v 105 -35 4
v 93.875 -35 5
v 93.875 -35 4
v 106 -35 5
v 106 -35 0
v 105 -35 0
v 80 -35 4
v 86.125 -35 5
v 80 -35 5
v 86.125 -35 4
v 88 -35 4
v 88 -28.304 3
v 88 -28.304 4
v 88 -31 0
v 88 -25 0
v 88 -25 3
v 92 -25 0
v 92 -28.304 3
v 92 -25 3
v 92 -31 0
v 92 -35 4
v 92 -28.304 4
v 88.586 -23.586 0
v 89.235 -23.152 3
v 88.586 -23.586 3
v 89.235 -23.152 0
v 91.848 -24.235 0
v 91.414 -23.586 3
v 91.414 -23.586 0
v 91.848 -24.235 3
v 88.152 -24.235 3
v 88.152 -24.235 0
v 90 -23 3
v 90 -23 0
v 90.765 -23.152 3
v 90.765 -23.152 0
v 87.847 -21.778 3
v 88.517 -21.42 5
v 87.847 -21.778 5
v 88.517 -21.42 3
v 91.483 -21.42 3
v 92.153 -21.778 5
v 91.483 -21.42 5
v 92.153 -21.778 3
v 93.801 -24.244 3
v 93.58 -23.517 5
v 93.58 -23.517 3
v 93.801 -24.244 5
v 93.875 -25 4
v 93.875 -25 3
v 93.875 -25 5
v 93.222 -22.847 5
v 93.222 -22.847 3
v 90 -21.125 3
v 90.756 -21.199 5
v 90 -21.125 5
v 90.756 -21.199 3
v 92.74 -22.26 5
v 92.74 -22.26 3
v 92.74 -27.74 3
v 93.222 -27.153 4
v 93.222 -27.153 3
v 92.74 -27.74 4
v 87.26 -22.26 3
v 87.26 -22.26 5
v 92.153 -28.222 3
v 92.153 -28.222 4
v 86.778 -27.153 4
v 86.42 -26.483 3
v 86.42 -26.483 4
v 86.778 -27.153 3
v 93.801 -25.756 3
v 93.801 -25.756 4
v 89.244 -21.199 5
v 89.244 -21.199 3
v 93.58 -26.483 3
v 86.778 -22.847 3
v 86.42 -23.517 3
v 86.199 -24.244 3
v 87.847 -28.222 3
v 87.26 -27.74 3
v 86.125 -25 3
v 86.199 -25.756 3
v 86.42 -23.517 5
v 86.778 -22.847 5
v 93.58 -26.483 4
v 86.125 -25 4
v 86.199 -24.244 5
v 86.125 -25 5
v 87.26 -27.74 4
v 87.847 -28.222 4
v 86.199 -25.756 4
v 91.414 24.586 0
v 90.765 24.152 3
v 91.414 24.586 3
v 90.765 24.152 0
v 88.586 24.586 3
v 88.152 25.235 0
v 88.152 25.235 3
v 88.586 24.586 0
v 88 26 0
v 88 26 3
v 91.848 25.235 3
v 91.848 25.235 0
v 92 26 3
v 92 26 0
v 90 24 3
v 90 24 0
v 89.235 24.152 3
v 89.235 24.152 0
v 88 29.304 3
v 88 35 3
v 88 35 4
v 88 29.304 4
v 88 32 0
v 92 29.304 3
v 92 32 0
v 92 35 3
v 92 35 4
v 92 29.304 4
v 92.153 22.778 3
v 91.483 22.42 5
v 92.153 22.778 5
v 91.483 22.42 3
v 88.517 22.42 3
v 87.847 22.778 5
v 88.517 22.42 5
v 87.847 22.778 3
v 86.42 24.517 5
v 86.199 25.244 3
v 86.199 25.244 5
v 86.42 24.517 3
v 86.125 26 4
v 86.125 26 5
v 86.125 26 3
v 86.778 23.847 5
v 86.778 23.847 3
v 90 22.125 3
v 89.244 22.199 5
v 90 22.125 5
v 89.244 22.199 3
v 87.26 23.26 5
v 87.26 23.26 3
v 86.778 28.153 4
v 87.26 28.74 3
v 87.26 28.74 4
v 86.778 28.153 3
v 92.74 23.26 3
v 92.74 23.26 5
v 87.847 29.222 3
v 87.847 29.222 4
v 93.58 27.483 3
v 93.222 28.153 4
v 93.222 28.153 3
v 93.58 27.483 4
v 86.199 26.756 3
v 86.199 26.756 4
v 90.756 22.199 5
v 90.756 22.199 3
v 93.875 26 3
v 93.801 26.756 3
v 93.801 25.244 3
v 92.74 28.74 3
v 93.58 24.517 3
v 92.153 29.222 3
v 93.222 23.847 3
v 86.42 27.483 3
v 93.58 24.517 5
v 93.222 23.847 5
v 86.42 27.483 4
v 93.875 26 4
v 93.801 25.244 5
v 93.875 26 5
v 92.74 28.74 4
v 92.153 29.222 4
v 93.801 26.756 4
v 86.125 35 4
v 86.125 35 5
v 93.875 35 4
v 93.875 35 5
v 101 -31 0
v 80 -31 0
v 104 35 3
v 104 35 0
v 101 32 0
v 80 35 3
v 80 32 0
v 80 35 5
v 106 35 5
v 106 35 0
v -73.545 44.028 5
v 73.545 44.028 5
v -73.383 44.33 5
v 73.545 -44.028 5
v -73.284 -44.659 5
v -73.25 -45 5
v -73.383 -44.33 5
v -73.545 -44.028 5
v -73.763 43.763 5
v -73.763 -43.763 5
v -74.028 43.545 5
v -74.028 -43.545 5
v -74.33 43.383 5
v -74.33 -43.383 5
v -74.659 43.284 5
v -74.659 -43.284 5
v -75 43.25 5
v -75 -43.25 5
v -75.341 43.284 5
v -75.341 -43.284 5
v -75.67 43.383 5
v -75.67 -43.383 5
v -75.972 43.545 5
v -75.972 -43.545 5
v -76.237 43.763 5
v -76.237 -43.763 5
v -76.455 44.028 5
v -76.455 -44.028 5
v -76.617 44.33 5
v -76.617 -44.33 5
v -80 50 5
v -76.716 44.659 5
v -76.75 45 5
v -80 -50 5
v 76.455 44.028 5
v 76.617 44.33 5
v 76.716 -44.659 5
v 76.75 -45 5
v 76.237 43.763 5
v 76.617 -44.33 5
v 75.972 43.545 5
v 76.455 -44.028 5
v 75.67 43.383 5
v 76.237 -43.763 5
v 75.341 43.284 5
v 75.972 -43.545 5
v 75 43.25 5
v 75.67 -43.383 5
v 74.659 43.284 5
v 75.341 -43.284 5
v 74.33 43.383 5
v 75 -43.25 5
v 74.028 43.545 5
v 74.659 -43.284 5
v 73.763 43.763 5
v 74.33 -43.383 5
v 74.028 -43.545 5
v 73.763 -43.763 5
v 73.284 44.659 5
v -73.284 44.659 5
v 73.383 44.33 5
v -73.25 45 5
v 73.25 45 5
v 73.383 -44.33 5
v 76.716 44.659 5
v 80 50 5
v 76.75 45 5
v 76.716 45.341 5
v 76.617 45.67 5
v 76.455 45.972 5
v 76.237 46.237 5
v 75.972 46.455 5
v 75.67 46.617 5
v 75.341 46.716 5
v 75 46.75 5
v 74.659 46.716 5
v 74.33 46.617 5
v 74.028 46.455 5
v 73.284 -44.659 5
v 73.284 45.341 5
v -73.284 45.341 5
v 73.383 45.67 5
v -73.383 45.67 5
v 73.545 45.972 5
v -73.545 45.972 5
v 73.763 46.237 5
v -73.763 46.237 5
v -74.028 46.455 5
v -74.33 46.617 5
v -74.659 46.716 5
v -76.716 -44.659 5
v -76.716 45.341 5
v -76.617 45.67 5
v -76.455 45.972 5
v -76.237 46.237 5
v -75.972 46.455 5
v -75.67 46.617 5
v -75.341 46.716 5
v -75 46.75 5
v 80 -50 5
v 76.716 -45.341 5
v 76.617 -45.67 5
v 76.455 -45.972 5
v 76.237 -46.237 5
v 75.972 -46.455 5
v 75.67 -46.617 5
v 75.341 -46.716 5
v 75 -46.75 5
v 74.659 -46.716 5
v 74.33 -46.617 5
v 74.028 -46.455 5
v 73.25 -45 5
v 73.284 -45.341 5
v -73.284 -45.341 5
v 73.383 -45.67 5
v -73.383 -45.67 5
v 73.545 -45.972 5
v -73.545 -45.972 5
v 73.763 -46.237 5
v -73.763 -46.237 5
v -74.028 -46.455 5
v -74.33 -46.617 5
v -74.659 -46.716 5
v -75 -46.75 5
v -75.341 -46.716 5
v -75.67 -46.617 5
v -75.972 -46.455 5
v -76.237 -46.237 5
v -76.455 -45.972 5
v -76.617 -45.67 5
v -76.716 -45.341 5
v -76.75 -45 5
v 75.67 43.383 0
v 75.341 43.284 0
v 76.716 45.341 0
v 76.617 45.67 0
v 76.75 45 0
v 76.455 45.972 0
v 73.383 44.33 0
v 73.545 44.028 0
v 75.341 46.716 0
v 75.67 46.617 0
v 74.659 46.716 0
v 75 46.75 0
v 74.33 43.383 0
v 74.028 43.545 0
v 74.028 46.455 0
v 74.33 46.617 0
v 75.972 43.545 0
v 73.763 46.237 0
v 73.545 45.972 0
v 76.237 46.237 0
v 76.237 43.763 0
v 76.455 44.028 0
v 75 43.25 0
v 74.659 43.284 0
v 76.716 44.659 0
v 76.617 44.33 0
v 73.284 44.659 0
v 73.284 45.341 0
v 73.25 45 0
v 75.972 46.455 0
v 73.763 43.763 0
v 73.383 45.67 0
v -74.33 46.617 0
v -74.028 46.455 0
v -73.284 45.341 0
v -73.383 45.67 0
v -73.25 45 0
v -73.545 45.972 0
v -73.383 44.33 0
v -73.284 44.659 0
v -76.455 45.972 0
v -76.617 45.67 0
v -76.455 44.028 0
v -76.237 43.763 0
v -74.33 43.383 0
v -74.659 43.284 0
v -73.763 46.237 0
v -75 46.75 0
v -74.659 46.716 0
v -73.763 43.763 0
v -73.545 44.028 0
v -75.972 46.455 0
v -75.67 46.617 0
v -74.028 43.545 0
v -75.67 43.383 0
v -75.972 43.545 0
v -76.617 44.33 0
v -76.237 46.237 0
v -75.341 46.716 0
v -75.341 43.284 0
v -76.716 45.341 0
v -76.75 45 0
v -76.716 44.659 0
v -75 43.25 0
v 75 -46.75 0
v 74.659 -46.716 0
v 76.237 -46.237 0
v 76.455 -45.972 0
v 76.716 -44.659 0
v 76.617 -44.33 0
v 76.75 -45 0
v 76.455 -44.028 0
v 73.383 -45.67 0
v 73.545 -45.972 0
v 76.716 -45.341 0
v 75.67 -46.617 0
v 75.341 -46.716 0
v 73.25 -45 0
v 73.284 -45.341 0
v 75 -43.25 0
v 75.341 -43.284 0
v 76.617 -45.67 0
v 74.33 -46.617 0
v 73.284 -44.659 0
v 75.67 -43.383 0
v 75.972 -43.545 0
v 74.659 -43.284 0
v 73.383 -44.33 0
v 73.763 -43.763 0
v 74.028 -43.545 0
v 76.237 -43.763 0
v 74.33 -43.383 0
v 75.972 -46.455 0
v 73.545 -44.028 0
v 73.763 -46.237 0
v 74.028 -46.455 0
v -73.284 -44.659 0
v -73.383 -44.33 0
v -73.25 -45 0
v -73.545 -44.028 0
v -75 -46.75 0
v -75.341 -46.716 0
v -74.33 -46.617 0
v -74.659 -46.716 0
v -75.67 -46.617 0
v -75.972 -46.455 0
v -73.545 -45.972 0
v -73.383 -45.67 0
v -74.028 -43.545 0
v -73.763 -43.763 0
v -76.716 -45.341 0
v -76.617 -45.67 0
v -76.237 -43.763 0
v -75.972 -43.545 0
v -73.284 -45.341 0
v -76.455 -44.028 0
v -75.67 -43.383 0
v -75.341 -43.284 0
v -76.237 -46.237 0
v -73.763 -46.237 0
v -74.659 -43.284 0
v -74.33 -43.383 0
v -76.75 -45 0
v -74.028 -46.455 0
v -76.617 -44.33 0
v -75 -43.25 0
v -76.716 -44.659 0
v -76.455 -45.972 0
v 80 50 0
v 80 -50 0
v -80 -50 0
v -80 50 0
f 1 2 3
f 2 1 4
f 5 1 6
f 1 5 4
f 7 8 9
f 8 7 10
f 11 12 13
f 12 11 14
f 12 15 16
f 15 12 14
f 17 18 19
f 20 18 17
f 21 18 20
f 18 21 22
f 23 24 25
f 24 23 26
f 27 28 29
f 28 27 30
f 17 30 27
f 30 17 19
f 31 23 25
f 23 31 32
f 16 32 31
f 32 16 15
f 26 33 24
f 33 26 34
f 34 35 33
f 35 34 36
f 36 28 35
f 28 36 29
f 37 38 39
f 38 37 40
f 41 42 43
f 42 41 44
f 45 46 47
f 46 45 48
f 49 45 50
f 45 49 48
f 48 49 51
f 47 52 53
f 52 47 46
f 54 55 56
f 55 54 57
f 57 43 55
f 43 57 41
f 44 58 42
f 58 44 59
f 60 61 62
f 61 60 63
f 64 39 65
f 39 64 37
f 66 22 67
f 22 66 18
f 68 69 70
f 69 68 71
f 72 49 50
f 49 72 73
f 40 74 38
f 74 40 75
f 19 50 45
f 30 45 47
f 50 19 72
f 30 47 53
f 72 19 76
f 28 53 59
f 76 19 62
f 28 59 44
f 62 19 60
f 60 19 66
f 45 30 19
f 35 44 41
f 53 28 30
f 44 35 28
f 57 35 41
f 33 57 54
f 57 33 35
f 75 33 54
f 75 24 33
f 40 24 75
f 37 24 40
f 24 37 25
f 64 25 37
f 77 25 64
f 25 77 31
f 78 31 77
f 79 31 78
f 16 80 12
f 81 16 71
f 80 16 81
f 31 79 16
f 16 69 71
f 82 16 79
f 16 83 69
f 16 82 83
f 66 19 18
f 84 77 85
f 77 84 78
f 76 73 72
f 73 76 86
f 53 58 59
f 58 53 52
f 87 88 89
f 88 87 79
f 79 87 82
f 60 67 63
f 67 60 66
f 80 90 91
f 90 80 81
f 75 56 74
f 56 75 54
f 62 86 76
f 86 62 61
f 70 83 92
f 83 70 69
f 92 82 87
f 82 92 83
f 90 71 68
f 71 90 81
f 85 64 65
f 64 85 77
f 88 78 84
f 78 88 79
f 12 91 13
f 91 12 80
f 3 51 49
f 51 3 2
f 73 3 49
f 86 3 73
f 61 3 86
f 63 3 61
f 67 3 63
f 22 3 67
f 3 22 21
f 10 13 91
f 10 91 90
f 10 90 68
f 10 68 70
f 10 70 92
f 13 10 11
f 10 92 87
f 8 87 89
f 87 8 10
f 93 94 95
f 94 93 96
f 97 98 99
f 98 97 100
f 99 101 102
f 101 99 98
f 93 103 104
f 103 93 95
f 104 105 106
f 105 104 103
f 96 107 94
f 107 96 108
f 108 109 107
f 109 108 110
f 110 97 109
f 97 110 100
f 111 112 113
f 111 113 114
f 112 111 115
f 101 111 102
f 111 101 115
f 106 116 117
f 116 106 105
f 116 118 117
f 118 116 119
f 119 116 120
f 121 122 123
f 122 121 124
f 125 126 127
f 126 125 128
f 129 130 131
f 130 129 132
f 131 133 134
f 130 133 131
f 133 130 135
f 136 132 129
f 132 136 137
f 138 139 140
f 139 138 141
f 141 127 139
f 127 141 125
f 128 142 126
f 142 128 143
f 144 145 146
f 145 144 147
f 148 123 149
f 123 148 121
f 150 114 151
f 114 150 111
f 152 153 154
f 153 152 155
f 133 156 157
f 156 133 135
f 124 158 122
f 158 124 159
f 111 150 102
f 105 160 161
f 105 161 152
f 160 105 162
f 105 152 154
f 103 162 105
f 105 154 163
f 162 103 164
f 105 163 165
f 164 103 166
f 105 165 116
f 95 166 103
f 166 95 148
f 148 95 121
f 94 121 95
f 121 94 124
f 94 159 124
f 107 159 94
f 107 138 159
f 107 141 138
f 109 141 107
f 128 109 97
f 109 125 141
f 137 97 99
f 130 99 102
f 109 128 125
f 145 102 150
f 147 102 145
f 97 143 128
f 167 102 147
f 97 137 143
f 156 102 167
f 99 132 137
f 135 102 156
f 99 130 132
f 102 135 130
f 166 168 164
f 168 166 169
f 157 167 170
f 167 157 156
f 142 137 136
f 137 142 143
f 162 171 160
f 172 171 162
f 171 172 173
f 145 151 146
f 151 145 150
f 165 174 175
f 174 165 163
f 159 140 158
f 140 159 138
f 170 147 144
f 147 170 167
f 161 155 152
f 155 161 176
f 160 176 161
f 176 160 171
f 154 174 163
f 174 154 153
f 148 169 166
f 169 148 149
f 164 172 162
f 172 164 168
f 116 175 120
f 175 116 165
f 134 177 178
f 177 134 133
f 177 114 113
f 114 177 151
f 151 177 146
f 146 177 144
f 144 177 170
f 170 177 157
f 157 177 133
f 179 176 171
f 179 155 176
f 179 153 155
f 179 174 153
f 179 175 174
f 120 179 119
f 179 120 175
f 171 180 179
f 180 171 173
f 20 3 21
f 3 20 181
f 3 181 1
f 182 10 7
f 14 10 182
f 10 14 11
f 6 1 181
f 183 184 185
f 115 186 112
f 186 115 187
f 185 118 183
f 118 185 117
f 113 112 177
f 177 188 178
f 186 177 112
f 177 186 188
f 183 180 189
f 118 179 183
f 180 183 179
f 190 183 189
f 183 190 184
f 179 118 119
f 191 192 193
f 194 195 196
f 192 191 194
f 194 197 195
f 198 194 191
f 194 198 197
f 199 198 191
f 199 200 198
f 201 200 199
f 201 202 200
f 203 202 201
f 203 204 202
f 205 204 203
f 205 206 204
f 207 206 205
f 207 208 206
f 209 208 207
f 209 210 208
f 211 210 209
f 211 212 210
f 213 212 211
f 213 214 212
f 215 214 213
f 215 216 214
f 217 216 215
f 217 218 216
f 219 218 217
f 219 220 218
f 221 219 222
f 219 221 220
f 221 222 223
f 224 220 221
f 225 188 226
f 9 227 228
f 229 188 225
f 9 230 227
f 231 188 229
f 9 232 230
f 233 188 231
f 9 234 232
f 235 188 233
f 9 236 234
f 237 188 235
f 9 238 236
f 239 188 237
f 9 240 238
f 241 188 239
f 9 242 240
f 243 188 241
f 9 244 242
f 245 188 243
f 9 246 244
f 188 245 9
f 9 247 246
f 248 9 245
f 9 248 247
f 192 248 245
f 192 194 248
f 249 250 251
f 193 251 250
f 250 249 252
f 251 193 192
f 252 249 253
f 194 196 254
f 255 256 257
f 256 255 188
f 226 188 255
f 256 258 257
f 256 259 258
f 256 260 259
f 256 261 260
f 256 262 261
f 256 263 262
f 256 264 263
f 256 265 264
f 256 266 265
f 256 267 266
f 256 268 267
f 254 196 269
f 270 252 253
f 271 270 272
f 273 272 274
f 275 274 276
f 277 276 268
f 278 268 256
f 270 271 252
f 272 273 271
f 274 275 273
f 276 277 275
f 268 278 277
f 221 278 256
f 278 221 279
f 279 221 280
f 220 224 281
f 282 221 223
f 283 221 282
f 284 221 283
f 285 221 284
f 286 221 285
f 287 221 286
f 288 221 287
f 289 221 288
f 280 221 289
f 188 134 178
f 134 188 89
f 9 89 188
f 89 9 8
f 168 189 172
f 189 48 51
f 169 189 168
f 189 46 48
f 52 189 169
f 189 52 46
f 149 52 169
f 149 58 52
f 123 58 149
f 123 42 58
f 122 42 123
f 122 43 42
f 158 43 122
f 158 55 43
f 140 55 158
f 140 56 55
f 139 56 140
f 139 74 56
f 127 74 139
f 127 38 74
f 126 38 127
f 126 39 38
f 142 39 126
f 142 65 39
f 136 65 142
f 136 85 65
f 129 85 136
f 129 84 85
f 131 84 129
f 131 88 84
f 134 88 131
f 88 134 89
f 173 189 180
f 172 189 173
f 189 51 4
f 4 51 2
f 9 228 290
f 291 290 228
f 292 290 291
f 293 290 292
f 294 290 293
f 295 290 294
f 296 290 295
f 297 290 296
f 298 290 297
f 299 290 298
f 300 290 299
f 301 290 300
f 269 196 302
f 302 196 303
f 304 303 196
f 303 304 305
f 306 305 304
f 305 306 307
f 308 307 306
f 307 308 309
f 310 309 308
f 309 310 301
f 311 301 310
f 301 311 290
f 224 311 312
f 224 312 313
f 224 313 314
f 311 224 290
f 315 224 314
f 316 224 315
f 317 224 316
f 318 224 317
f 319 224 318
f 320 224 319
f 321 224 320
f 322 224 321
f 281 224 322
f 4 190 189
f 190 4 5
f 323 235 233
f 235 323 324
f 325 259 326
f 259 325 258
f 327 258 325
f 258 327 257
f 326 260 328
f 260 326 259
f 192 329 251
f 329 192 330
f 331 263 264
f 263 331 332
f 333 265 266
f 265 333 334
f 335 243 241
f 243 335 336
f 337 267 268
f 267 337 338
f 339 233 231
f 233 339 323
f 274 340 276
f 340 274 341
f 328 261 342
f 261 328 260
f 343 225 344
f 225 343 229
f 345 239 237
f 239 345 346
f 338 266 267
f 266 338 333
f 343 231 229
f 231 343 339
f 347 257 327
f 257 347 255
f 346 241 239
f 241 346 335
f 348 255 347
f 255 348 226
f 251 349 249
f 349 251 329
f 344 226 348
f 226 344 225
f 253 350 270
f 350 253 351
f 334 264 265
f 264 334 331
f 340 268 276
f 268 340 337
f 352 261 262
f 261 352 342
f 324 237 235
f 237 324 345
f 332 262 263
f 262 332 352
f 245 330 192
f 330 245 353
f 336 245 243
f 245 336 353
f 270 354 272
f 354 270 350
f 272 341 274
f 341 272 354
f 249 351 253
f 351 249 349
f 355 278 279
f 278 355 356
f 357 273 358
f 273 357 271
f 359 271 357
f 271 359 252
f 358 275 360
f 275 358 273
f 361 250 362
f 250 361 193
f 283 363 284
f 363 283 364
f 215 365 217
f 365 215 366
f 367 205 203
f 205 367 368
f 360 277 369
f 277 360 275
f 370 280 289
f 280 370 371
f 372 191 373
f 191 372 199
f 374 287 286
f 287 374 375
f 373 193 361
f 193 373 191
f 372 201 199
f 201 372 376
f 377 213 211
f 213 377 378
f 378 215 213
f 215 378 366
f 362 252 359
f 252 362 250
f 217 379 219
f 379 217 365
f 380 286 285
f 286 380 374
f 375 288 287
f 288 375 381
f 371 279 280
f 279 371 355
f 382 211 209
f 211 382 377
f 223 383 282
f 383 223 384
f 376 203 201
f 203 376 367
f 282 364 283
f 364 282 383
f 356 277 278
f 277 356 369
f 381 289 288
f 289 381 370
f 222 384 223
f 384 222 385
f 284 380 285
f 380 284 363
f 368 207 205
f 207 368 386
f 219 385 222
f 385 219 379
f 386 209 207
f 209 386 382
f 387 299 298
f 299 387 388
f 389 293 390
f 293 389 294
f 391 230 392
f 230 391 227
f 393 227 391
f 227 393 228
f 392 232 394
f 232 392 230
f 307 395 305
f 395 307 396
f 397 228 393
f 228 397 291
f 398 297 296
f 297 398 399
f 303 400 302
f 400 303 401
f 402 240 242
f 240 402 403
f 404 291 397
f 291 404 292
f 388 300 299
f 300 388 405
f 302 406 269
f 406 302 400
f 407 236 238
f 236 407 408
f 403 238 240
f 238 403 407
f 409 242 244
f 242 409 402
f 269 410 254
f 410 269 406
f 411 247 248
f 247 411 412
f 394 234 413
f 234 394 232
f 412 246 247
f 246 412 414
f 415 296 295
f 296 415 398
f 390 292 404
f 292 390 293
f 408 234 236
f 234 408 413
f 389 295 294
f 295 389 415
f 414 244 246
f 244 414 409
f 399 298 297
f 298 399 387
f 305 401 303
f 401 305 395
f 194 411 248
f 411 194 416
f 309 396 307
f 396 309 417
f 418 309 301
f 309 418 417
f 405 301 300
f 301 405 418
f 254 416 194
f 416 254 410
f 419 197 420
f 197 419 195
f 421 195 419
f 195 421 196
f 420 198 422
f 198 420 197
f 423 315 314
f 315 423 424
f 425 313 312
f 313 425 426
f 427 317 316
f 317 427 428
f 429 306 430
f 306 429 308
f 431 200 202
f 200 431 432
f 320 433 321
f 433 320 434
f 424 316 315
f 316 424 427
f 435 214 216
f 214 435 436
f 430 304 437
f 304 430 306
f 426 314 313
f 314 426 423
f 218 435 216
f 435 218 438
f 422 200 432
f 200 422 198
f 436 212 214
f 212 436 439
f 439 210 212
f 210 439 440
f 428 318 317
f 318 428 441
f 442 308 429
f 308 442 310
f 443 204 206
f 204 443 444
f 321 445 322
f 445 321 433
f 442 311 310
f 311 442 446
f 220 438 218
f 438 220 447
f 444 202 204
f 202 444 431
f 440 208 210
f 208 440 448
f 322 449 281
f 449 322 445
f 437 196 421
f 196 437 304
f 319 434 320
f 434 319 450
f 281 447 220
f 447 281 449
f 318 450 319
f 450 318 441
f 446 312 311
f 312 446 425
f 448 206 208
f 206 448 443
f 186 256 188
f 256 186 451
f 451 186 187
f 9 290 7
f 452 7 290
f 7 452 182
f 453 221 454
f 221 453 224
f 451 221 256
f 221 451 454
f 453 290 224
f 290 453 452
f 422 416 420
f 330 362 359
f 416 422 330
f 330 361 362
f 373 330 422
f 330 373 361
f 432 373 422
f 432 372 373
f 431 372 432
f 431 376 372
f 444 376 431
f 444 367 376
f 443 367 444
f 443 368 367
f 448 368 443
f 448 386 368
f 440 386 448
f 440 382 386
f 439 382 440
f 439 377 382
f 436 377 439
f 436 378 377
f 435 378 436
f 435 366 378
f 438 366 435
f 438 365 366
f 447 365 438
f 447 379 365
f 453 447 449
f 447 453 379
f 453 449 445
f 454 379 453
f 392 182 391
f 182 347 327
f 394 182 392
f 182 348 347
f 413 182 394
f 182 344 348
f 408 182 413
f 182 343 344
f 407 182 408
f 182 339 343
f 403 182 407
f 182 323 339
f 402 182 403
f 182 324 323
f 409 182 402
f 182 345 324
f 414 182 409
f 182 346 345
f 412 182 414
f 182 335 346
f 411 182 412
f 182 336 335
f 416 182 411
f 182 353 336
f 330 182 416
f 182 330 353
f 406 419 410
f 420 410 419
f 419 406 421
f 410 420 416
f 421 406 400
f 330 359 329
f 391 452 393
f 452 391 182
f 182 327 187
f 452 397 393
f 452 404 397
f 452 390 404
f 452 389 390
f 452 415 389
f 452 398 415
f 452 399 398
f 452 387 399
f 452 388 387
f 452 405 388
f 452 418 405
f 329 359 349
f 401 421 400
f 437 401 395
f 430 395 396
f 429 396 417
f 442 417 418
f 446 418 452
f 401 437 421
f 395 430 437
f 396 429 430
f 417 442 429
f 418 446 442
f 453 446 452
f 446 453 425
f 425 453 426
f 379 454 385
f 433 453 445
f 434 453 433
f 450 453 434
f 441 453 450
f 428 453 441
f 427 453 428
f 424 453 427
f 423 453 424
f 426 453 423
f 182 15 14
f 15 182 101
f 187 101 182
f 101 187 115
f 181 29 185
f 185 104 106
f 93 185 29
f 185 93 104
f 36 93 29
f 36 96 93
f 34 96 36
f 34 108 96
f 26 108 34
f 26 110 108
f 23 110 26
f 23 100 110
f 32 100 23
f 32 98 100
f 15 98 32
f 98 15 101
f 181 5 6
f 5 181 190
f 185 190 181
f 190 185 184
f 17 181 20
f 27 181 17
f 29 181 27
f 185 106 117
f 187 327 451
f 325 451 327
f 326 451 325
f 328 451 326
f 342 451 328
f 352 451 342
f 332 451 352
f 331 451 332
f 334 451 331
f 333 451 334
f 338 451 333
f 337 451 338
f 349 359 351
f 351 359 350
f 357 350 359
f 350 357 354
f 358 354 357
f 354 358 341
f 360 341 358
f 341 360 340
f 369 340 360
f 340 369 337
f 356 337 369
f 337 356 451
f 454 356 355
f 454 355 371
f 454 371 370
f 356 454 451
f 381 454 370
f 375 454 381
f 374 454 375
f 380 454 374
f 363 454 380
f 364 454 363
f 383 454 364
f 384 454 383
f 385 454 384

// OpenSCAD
// Generated by SolidPython 1.1.3 on 2024-01-12 12:28:14


difference() {
	union() {
		translate(v = [90, 0, -11]) {
			rotate(a = 90, v = [0, 0, 1]) {
				difference() {
					union() {
						union();
						translate(v = [-35, 0, 0]) {
							rotate(a = [0, 90.0, 0.0]) {
								translate(v = [0, 0, 35.0]) {
									cube(center = true, size = [32.0000000000, 32.0000000000, 70.0]);
								}
							}
						}
						union();
					}
					union() {
						union();
						translate(v = [-35, 0, 0]) {
							rotate(a = [0, 90.0, 0.0]) {
								translate(v = [0, 0, 10]) {
									rotate(a = -90, v = [0, -1, 0]) {
										rotate(a = 90, v = [0, 0, 1]) {
											union() {
												union();
												translate(v = [0, -10, 0]) {
													rotate(a = -90, v = [1, 0, 0]) {
														polyhedron(convexity = 10, faces = [[0, 1, 4], [1, 5, 4], [1, 2, 5], [2, 6, 5], [2, 3, 6], [3, 7, 6], [3, 0, 7], [0, 4, 7], [3, 2, 1, 0], [4, 5, 6, 7]], points = [[-15.0000000000, 15.0000000000, 0.0000000000], [15.0000000000, 15.0000000000, 0.0000000000], [15.0000000000, -15.0000000000, 0.0000000000], [-15.0000000000, -15.0000000000, 0.0000000000], [0.0000000000, 0.0000000000, 15.0000000000], [0.0000000000, 0.0000000000, 15.0000000000], [0.0000000000, 0.0000000000, 15.0000000000], [0.0000000000, 0.0000000000, 15.0000000000]]);
													}
												}
												translate(v = [0, 51.0, 0]) {
													rotate(a = 180, v = [1, 0, 0]) {
														translate(v = [0, -10, 0]) {
															rotate(a = -90, v = [1, 0, 0]) {
																polyhedron(convexity = 10, faces = [[0, 1, 4], [1, 5, 4], [1, 2, 5], [2, 6, 5], [2, 3, 6], [3, 7, 6], [3, 0, 7], [0, 4, 7], [3, 2, 1, 0], [4, 5, 6, 7]], points = [[-15.0000000000, 15.0000000000, 0.0000000000], [15.0000000000, 15.0000000000, 0.0000000000], [15.0000000000, -15.0000000000, 0.0000000000], [-15.0000000000, -15.0000000000, 0.0000000000], [0.0000000000, 0.0000000000, 15.0000000000], [0.0000000000, 0.0000000000, 15.0000000000], [0.0000000000, 0.0000000000, 15.0000000000], [0.0000000000, 0.0000000000, 15.0000000000]]);
															}
														}
													}
												}
												translate(v = [0, -10, 0]) {
													rotate(a = -90, v = [1, 0, 0]) {
														union() {
															polyhedron(convexity = 10, faces = [[0, 1, 5], [1, 6, 5], [1, 2, 6], [2, 7, 6], [2, 3, 7], [3, 8, 7], [3, 4, 8], [4, 9, 8], [4, 0, 9], [0, 5, 9], [4, 3, 2, 1, 0], [5, 6, 7, 8, 9]], points = [[-10.2, 10.2, 0.0], [-10.2, 2.8, 0.0], [-4.3999999999999995, 2.8, 0.0], [-4.3999999999999995, 0.0, 0.0], [0.0, 0.0, 0.0], [-10.2, 10.2, 70.0], [-10.2, 2.8, 70.0], [-4.3999999999999995, 2.8, 70.0], [-4.3999999999999995, 0.0, 70.0], [0.0, 0.0, 70.0]]);
															mirror(v = [0, 1]) {
																polyhedron(convexity = 10, faces = [[0, 1, 5], [1, 6, 5], [1, 2, 6], [2, 7, 6], [2, 3, 7], [3, 8, 7], [3, 4, 8], [4, 9, 8], [4, 0, 9], [0, 5, 9], [4, 3, 2, 1, 0], [5, 6, 7, 8, 9]], points = [[-10.2, 10.2, 0.0], [-10.2, 2.8, 0.0], [-4.3999999999999995, 2.8, 0.0], [-4.3999999999999995, 0.0, 0.0], [0.0, 0.0, 0.0], [-10.2, 10.2, 70.0], [-10.2, 2.8, 70.0], [-4.3999999999999995, 2.8, 70.0], [-4.3999999999999995, 0.0, 70.0], [0.0, 0.0, 70.0]]);
															}
															mirror(v = [1, 1]) {
																union() {
																	polyhedron(convexity = 10, faces = [[0, 1, 5], [1, 6, 5], [1, 2, 6], [2, 7, 6], [2, 3, 7], [3, 8, 7], [3, 4, 8], [4, 9, 8], [4, 0, 9], [0, 5, 9], [4, 3, 2, 1, 0], [5, 6, 7, 8, 9]], points = [[-10.2, 10.2, 0.0], [-10.2, 2.8, 0.0], [-4.3999999999999995, 2.8, 0.0], [-4.3999999999999995, 0.0, 0.0], [0.0, 0.0, 0.0], [-10.2, 10.2, 70.0], [-10.2, 2.8, 70.0], [-4.3999999999999995, 2.8, 70.0], [-4.3999999999999995, 0.0, 70.0], [0.0, 0.0, 70.0]]);
																	mirror(v = [0, 1]) {
																		polyhedron(convexity = 10, faces = [[0, 1, 5], [1, 6, 5], [1, 2, 6], [2, 7, 6], [2, 3, 7], [3, 8, 7], [3, 4, 8], [4, 9, 8], [4, 0, 9], [0, 5, 9], [4, 3, 2, 1, 0], [5, 6, 7, 8, 9]], points = [[-10.2, 10.2, 0.0], [-10.2, 2.8, 0.0], [-4.3999999999999995, 2.8, 0.0], [-4.3999999999999995, 0.0, 0.0], [0.0, 0.0, 0.0], [-10.2, 10.2, 70.0], [-10.2, 2.8, 70.0], [-4.3999999999999995, 2.8, 70.0], [-4.3999999999999995, 0.0, 70.0], [0.0, 0.0, 70.0]]);
																	}
																}
															}
															mirror(v = [1, -1]) {
																union() {
																	polyhedron(convexity = 10, faces = [[0, 1, 5], [1, 6, 5], [1, 2, 6], [2, 7, 6], [2, 3, 7], [3, 8, 7], [3, 4, 8], [4, 9, 8], [4, 0, 9], [0, 5, 9], [4, 3, 2, 1, 0], [5, 6, 7, 8, 9]], points = [[-10.2, 10.2, 0.0], [-10.2, 2.8, 0.0], [-4.3999999999999995, 2.8, 0.0], [-4.3999999999999995, 0.0, 0.0], [0.0, 0.0, 0.0], [-10.2, 10.2, 70.0], [-10.2, 2.8, 70.0], [-4.3999999999999995, 2.8, 70.0], [-4.3999999999999995, 0.0, 70.0], [0.0, 0.0, 70.0]]);
																	mirror(v = [0, 1]) {
																		polyhedron(convexity = 10, faces = [[0, 1, 5], [1, 6, 5], [1, 2, 6], [2, 7, 6], [2, 3, 7], [3, 8, 7], [3, 4, 8], [4, 9, 8], [4, 0, 9], [0, 5, 9], [4, 3, 2, 1, 0], [5, 6, 7, 8, 9]], points = [[-10.2, 10.2, 0.0], [-10.2, 2.8, 0.0], [-4.3999999999999995, 2.8, 0.0], [-4.3999999999999995, 0.0, 0.0], [0.0, 0.0, 0.0], [-10.2, 10.2, 70.0], [-10.2, 2.8, 70.0], [-4.3999999999999995, 2.8, 70.0], [-4.3999999999999995, 0.0, 70.0], [0.0, 0.0, 70.0]]);
																	}
																	mirror(v = [1, 1]) {
																		union() {
																			polyhedron(convexity = 10, faces = [[0, 1, 5], [1, 6, 5], [1, 2, 6], [2, 7, 6], [2, 3, 7], [3, 8, 7], [3, 4, 8], [4, 9, 8], [4, 0, 9], [0, 5, 9], [4, 3, 2, 1, 0], [5, 6, 7, 8, 9]], points = [[-10.2, 10.2, 0.0], [-10.2, 2.8, 0.0], [-4.3999999999999995, 2.8, 0.0], [-4.3999999999999995, 0.0, 0.0], [0.0, 0.0, 0.0], [-10.2, 10.2, 70.0], [-10.2, 2.8, 70.0], [-4.3999999999999995, 2.8, 70.0], [-4.3999999999999995, 0.0, 70.0], [0.0, 0.0, 70.0]]);
																			mirror(v = [0, 1]) {
																				polyhedron(convexity = 10, faces = [[0, 1, 5], [1, 6, 5], [1, 2, 6], [2, 7, 6], [2, 3, 7], [3, 8, 7], [3, 4, 8], [4, 9, 8], [4, 0, 9], [0, 5, 9], [4, 3, 2, 1, 0], [5, 6, 7, 8, 9]], points = [[-10.2, 10.2, 0.0], [-10.2, 2.8, 0.0], [-4.3999999999999995, 2.8, 0.0], [-4.3999999999999995, 0.0, 0.0], [0.0, 0.0, 0.0], [-10.2, 10.2, 70.0], [-10.2, 2.8, 70.0], [-4.3999999999999995, 2.8, 70.0], [-4.3999999999999995, 0.0, 70.0], [0.0, 0.0, 70.0]]);
																			}
																		}
																	}
																}
															}
														}
													}
												}
												union() {
													union();
													rotate(a = 180, v = [0, 1, 0]) {
														union() {
															translate(v = [0, 0, 14]) {
																cylinder($fn = 32, h = 4, r = 3.8750000000);
															}
															translate(v = [-3.8750000000, -12, 15]) {
																cube(size = [7.7500000000, 12, 4]);
															}
															union() {
																cylinder($fn = 16, h = 19, r = 2.0000000000);
																translate(v = [-2.0000000000, -12, 0]) {
																	cube(size = [4, 12, 19]);
																}
															}
															rotate(a = -90, v = [0, 1, 0]) {
																polyhedron(convexity = 10, faces = [[0, 1, 3], [1, 4, 3], [1, 2, 4], [2, 5, 4], [2, 0, 5], [0, 3, 5], [2, 1, 0], [3, 4, 5]], points = [[0.0000000000, -10.0000000000, 0.0000000000], [10.1000000000, -10.0000000000, 10.1000000000], [10.1000000000, -10.0000000000, -10.1000000000], [0.0000000000, 12.0000000000, 0.0000000000], [10.1000000000, 12.0000000000, 10.1000000000], [10.1000000000, 12.0000000000, -10.1000000000]]);
															}
														}
													}
													rotate(a = 90, v = [0, 1, 0]) {
														union() {
															translate(v = [0, 0, 14]) {
																cylinder($fn = 32, h = 4, r = 3.8750000000);
															}
															translate(v = [-3.8750000000, -12, 15]) {
																cube(size = [7.7500000000, 12, 4]);
															}
															union() {
																cylinder($fn = 16, h = 19, r = 2.0000000000);
																translate(v = [-2.0000000000, -12, 0]) {
																	cube(size = [4, 12, 19]);
																}
															}
															rotate(a = -90, v = [0, 1, 0]) {
																polyhedron(convexity = 10, faces = [[0, 1, 3], [1, 4, 3], [1, 2, 4], [2, 5, 4], [2, 0, 5], [0, 3, 5], [2, 1, 0], [3, 4, 5]], points = [[0.0000000000, -10.0000000000, 0.0000000000], [10.1000000000, -10.0000000000, 10.1000000000], [10.1000000000, -10.0000000000, -10.1000000000], [0.0000000000, 12.0000000000, 0.0000000000], [10.1000000000, 12.0000000000, 10.1000000000], [10.1000000000, 12.0000000000, -10.1000000000]]);
															}
														}
													}
													union() {
														translate(v = [0, 0, 14]) {
															cylinder($fn = 32, h = 4, r = 3.8750000000);
														}
														translate(v = [-3.8750000000, -12, 15]) {
															cube(size = [7.7500000000, 12, 4]);
														}
														union() {
															cylinder($fn = 16, h = 19, r = 2.0000000000);
															translate(v = [-2.0000000000, -12, 0]) {
																cube(size = [4, 12, 19]);
															}
														}
														rotate(a = -90, v = [0, 1, 0]) {
															polyhedron(convexity = 10, faces = [[0, 1, 3], [1, 4, 3], [1, 2, 4], [2, 5, 4], [2, 0, 5], [0, 3, 5], [2, 1, 0], [3, 4, 5]], points = [[0.0000000000, -10.0000000000, 0.0000000000], [10.1000000000, -10.0000000000, 10.1000000000], [10.1000000000, -10.0000000000, -10.1000000000], [0.0000000000, 12.0000000000, 0.0000000000], [10.1000000000, 12.0000000000, 10.1000000000], [10.1000000000, 12.0000000000, -10.1000000000]]);
														}
													}
													rotate(a = 270, v = [0, 1, 0]) {
														union() {
															translate(v = [0, 0, 14]) {
																cylinder($fn = 32, h = 4, r = 3.8750000000);
															}
															translate(v = [-3.8750000000, -12, 15]) {
																cube(size = [7.7500000000, 12, 4]);
															}
															union() {
																cylinder($fn = 16, h = 19, r = 2.0000000000);
																translate(v = [-2.0000000000, -12, 0]) {
																	cube(size = [4, 12, 19]);
																}
															}
															rotate(a = -90, v = [0, 1, 0]) {
																polyhedron(convexity = 10, faces = [[0, 1, 3], [1, 4, 3], [1, 2, 4], [2, 5, 4], [2, 0, 5], [0, 3, 5], [2, 1, 0], [3, 4, 5]], points = [[0.0000000000, -10.0000000000, 0.0000000000], [10.1000000000, -10.0000000000, 10.1000000000], [10.1000000000, -10.0000000000, -10.1000000000], [0.0000000000, 12.0000000000, 0.0000000000], [10.1000000000, 12.0000000000, 10.1000000000], [10.1000000000, 12.0000000000, -10.1000000000]]);
															}
														}
													}
													translate(v = [0, 51.0, 0]) {
														rotate(a = 180, v = [1, 0, 0]) {
															rotate(a = 180, v = [0, 1, 0]) {
																union() {
																	translate(v = [0, 0, 14]) {
																		cylinder($fn = 32, h = 4, r = 3.8750000000);
																	}
																	translate(v = [-3.8750000000, -12, 15]) {
																		cube(size = [7.7500000000, 12, 4]);
																	}
																	union() {
																		cylinder($fn = 16, h = 19, r = 2.0000000000);
																		translate(v = [-2.0000000000, -12, 0]) {
																			cube(size = [4, 12, 19]);
																		}
																	}
																	rotate(a = -90, v = [0, 1, 0]) {
																		polyhedron(convexity = 10, faces = [[0, 1, 3], [1, 4, 3], [1, 2, 4], [2, 5, 4], [2, 0, 5], [0, 3, 5], [2, 1, 0], [3, 4, 5]], points = [[0.0000000000, -10.0000000000, 0.0000000000], [10.1000000000, -10.0000000000, 10.1000000000], [10.1000000000, -10.0000000000, -10.1000000000], [0.0000000000, 12.0000000000, 0.0000000000], [10.1000000000, 12.0000000000, 10.1000000000], [10.1000000000, 12.0000000000, -10.1000000000]]);
																	}
																}
															}
														}
													}
													translate(v = [0, 51.0, 0]) {
														rotate(a = 180, v = [1, 0, 0]) {
															rotate(a = 90, v = [0, 1, 0]) {
																union() {
																	translate(v = [0, 0, 14]) {
																		cylinder($fn = 32, h = 4, r = 3.8750000000);
																	}
																	translate(v = [-3.8750000000, -12, 15]) {
																		cube(size = [7.7500000000, 12, 4]);
																	}
																	union() {
																		cylinder($fn = 16, h = 19, r = 2.0000000000);
																		translate(v = [-2.0000000000, -12, 0]) {
																			cube(size = [4, 12, 19]);
																		}
																	}
																	rotate(a = -90, v = [0, 1, 0]) {
																		polyhedron(convexity = 10, faces = [[0, 1, 3], [1, 4, 3], [1, 2, 4], [2, 5, 4], [2, 0, 5], [0, 3, 5], [2, 1, 0], [3, 4, 5]], points = [[0.0000000000, -10.0000000000, 0.0000000000], [10.1000000000, -10.0000000000, 10.1000000000], [10.1000000000, -10.0000000000, -10.1000000000], [0.0000000000, 12.0000000000, 0.0000000000], [10.1000000000, 12.0000000000, 10.1000000000], [10.1000000000, 12.0000000000, -10.1000000000]]);
																	}
																}
															}
														}
													}
													translate(v = [0, 51.0, 0]) {
														rotate(a = 180, v = [1, 0, 0]) {
															union() {
																translate(v = [0, 0, 14]) {
																	cylinder($fn = 32, h = 4, r = 3.8750000000);
																}
																translate(v = [-3.8750000000, -12, 15]) {
																	cube(size = [7.7500000000, 12, 4]);
																}
																union() {
																	cylinder($fn = 16, h = 19, r = 2.0000000000);
																	translate(v = [-2.0000000000, -12, 0]) {
																		cube(size = [4, 12, 19]);
																	}
																}
																rotate(a = -90, v = [0, 1, 0]) {
																	polyhedron(convexity = 10, faces = [[0, 1, 3], [1, 4, 3], [1, 2, 4], [2, 5, 4], [2, 0, 5], [0, 3, 5], [2, 1, 0], [3, 4, 5]], points = [[0.0000000000, -10.0000000000, 0.0000000000], [10.1000000000, -10.0000000000, 10.1000000000], [10.1000000000, -10.0000000000, -10.1000000000], [0.0000000000, 12.0000000000, 0.0000000000], [10.1000000000, 12.0000000000, 10.1000000000], [10.1000000000, 12.0000000000, -10.1000000000]]);
																}
															}
														}
													}
													translate(v = [0, 51.0, 0]) {
														rotate(a = 180, v = [1, 0, 0]) {
															rotate(a = 270, v = [0, 1, 0]) {
																union() {
																	translate(v = [0, 0, 14]) {
																		cylinder($fn = 32, h = 4, r = 3.8750000000);
																	}
																	translate(v = [-3.8750000000, -12, 15]) {
																		cube(size = [7.7500000000, 12, 4]);
																	}
																	union() {
																		cylinder($fn = 16, h = 19, r = 2.0000000000);
																		translate(v = [-2.0000000000, -12, 0]) {
																			cube(size = [4, 12, 19]);
																		}
																	}
																	rotate(a = -90, v = [0, 1, 0]) {
																		polyhedron(convexity = 10, faces = [[0, 1, 3], [1, 4, 3], [1, 2, 4], [2, 5, 4], [2, 0, 5], [0, 3, 5], [2, 1, 0], [3, 4, 5]], points = [[0.0000000000, -10.0000000000, 0.0000000000], [10.1000000000, -10.0000000000, 10.1000000000], [10.1000000000, -10.0000000000, -10.1000000000], [0.0000000000, 12.0000000000, 0.0000000000], [10.1000000000, 12.0000000000, 10.1000000000], [10.1000000000, 12.0000000000, -10.1000000000]]);
																	}
																}
															}
														}
													}
												}
											}
										}
									}
								}
							}
						}
					}
				}
			}
		}
		difference() {
			cube(center = true, size = [160, 100, 10]);
			union() {
				union();
				translate(v = [75.0000000000, 45.0000000000, 5.0000000000]) {
					cylinder($fn = 32, center = true, h = 20, r = 1.7500000000);
				}
				translate(v = [-75.0000000000, 45.0000000000, 5.0000000000]) {
					cylinder($fn = 32, center = true, h = 20, r = 1.7500000000);
				}
				translate(v = [75.0000000000, -45.0000000000, 5.0000000000]) {
					cylinder($fn = 32, center = true, h = 20, r = 1.7500000000);
				}
				translate(v = [-75.0000000000, -45.0000000000, 5.0000000000]) {
					cylinder($fn = 32, center = true, h = 20, r = 1.7500000000);
				}
			}
		}
	}
	translate(v = [0, 0, -150]) {
		cube(center = true, size = [300, 300, 300]);
	}
}
/***********************************************
*********      SolidPython code:      **********
************************************************
 
#! /usr/bin/env python3
import sys
from math import cos, radians, sin, pi, tau
from pathlib import Path

from solid import *
from solid.utils import *

from typing import Set, Sequence, List, Callable, Optional, Union, Iterable, Tuple

import numpy as np

import extrusion_fittings as ef

class mount():
	def __init__(self,board_length = 160,board_width = 100,screw_offset = 10,screw_dia = 3.5,mount_thickness = 10):
		self.board_length = board_length
		self.board_width = board_width
		self.screw_offset = screw_offset
		self.screw_length = board_length - screw_offset
		self.screw_width = board_width - screw_offset
		self.screw_dia = screw_dia
		self.mount_thickness = mount_thickness

	def screws(self) -> OpenSCADObject:
		c = cylinder(r=self.screw_dia/2, h=20, segments = 32, center=True)
		screw = OpenSCADObject(name="union",params={})
		screw += translate([self.screw_length/2,self.screw_width/2,self.mount_thickness/2])(c)
		screw += translate([-self.screw_length/2,self.screw_width/2,self.mount_thickness/2])(c)
		screw += translate([self.screw_length/2,-self.screw_width/2,self.mount_thickness/2])(c)
		screw += translate([-self.screw_length/2,-self.screw_width/2,self.mount_thickness/2])(c)
		return screw

	def plate(self) -> OpenSCADObject:
		p = cube([self.board_length,self.board_width,self.mount_thickness],center = True)
		p-= self.screws()
		return p

	def bisect_floor(self,input) -> OpenSCADObject:
		size = 300
		floor = translate([0,0,-150])(cube([300,300,300],center = True))
		return input - floor


if __name__ == "__main__":
	out_dir = sys.argv[1] if len(sys.argv) > 1 else Path(__file__).parent

	e = ef.Fittings(35)
	a = e.tube()
	a = rotate(a=90,v=[0,0,1])(a)
	m = mount()	
	a = translate([90,0,-11])(a)
	a += m.plate()
	a = m.bisect_floor(a)

	file_out = scad_render_to_file(a,  out_dir=out_dir, include_orig_code=True)
	print(f"{__file__}: SCAD file written to: \n{file_out}")
 
 
************************************************/
